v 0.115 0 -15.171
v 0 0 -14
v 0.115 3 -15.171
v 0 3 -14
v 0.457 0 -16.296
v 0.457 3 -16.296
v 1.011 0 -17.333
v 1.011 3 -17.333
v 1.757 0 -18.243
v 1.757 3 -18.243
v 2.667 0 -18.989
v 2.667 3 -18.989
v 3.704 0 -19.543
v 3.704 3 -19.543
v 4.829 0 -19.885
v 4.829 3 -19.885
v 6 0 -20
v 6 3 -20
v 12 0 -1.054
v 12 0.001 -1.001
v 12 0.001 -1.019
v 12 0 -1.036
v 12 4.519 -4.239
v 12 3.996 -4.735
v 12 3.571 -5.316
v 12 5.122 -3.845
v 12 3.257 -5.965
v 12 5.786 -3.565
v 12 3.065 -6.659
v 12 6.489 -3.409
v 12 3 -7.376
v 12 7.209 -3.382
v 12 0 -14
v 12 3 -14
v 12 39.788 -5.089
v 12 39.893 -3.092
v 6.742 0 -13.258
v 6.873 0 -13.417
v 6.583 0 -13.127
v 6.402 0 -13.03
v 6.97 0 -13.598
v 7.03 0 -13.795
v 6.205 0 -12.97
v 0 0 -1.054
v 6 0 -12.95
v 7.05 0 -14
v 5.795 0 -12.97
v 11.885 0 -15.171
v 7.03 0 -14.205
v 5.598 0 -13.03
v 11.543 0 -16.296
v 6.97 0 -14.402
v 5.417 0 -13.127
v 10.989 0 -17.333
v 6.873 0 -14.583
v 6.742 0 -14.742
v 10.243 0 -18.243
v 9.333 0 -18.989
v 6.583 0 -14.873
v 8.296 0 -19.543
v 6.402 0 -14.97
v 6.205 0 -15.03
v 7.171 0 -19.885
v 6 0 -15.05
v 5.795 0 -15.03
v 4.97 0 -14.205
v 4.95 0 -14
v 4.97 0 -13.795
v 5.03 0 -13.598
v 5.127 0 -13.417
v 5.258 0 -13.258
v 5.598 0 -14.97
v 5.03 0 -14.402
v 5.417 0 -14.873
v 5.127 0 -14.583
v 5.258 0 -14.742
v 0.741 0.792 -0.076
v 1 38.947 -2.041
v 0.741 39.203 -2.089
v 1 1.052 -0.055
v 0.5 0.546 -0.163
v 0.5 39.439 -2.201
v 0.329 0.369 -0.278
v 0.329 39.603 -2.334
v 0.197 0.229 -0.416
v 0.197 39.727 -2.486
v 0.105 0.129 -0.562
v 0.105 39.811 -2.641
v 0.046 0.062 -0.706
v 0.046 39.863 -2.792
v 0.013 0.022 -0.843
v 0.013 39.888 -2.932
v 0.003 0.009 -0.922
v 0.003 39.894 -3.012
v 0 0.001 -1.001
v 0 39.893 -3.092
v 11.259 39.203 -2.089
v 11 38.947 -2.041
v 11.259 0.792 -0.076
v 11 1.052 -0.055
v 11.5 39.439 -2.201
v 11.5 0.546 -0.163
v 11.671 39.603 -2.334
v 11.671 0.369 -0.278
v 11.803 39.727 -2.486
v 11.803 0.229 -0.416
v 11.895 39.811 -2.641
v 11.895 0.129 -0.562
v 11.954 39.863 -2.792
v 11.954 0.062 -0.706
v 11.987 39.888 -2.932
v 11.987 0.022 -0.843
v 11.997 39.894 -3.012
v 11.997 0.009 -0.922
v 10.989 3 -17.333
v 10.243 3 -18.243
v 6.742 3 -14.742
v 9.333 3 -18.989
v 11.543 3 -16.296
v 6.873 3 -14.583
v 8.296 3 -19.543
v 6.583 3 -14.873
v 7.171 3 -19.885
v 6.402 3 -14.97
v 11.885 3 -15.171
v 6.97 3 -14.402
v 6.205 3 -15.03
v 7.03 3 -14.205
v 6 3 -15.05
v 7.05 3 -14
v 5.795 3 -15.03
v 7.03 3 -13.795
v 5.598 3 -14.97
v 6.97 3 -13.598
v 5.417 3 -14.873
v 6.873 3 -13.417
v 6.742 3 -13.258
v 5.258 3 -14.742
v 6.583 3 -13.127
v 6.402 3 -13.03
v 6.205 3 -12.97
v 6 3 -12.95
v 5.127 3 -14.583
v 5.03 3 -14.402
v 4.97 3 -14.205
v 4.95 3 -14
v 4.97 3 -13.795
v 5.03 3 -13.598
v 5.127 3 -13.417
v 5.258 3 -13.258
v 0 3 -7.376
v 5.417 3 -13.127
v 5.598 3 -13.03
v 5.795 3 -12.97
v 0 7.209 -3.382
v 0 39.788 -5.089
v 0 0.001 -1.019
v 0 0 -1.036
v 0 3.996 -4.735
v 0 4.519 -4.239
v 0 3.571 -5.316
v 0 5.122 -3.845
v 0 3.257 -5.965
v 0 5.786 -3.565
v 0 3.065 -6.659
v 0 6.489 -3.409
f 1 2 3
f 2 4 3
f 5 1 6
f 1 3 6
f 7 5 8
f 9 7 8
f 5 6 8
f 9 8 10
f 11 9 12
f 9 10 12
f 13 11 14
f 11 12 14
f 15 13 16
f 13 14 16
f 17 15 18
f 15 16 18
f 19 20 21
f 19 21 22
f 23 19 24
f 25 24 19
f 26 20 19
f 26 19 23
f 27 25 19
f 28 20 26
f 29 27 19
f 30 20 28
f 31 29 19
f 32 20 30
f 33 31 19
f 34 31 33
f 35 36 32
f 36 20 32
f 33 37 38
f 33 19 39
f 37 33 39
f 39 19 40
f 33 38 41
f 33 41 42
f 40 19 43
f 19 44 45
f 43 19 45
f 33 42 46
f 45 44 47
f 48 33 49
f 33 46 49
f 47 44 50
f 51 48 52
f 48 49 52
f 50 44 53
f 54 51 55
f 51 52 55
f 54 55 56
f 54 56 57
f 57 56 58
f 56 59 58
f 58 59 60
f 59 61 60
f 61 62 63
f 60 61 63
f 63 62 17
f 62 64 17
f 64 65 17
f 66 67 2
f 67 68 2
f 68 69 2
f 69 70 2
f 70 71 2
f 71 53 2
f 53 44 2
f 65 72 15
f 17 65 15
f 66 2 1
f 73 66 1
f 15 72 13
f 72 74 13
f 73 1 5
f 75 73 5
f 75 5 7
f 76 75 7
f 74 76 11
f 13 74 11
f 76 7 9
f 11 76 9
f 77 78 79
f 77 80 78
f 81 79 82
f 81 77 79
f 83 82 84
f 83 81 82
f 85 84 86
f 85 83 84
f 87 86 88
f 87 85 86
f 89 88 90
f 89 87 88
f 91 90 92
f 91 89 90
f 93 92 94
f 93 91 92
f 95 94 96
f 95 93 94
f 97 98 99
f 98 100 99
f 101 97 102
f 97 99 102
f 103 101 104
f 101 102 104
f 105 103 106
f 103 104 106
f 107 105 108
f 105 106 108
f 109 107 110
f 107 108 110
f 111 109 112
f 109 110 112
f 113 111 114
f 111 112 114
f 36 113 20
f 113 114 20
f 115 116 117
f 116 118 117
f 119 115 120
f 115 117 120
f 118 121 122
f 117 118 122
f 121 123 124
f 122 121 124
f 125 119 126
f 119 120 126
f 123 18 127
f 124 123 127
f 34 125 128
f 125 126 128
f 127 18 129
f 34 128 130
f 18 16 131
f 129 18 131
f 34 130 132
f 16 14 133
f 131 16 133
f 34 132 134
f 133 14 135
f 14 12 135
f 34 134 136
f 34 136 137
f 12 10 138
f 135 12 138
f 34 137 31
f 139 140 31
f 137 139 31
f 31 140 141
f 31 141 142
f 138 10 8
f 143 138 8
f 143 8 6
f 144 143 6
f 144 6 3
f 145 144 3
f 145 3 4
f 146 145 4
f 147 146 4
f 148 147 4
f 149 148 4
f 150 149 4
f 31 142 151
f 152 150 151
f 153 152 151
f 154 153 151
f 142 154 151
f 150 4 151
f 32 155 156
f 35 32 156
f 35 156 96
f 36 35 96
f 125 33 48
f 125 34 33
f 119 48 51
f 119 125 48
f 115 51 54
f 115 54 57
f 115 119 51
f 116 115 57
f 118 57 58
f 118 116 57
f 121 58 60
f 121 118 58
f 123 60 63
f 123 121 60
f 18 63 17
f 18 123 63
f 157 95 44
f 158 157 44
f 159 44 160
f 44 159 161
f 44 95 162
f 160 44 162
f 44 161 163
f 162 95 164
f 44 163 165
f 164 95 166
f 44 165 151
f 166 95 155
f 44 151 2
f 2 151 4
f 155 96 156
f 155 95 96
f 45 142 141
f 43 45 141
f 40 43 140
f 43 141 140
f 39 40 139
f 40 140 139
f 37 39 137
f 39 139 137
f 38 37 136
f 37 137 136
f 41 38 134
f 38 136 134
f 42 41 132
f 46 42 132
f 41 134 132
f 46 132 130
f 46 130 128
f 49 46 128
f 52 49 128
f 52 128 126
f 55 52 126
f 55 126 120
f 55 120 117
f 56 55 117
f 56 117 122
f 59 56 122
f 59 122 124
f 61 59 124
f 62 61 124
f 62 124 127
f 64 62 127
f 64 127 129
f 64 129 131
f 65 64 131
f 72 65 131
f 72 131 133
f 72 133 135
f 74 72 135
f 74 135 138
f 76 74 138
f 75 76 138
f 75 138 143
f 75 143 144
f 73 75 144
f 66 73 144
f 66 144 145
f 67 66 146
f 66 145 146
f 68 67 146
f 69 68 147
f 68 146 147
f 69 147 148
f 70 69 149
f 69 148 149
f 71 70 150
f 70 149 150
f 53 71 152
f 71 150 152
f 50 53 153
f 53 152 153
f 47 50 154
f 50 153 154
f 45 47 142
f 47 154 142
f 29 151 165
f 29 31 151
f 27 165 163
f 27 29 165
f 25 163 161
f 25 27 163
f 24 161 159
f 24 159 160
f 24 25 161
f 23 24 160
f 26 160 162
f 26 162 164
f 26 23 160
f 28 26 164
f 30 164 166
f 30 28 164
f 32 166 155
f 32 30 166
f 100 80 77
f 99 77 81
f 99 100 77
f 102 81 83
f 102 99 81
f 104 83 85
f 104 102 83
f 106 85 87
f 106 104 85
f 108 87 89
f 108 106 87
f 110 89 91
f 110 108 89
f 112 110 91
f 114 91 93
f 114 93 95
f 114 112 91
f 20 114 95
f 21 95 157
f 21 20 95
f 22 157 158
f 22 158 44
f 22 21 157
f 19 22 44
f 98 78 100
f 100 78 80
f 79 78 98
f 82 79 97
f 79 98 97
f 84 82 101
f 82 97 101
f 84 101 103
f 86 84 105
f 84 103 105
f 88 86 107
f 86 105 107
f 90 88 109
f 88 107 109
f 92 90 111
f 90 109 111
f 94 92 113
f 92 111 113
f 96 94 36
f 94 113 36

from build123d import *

# Parameters (mm, degrees)
EXTRUDE_1_DEPTH     = 12
SKETCH_2_R          = 1.05
CUT_EXTRUDE_1_DEPTH = 12
FILLET_1_R          = 1
FILLET_2_R          = 6
FILLET_3_R          = 4


with BuildPart() as part:
    # 草图1 → 凸台-拉伸1 (new body)
    with BuildSketch(Plane(origin=(0, 0, 0), x_dir=(0, 0, -1), z_dir=(1, 0, 0))):
        Polygon((2.09343825, 39.94518139), (0, 0), (20, 0), (20, 3), (3.161340376, 3), (5.089326854, 39.788173521), align=None)
    extrude(amount=EXTRUDE_1_DEPTH)

    # 草图2 → 切除-拉伸1 (cut)
    with BuildSketch(Plane(origin=(0, 3, 0), x_dir=(1, 0, 0), z_dir=(0, 1, 0))):
        with Locations(Location((6, 14, 0), (0, 0, 270))):
            Circle(SKETCH_2_R)
    extrude(amount=-CUT_EXTRUDE_1_DEPTH, mode=Mode.SUBTRACT)

    # 圆角1
    fillet_1_edges = [part.edges().sort_by_distance(p)[0] for p in [
        (6, 0, 0),
        (6, 39.94518139, -2.09343825),
        (0, 19.972590695, -1.046719125),
        (12, 19.972590695, -1.046719125),
    ]]
    fillet(fillet_1_edges, radius=FILLET_1_R)

    # 圆角2
    fillet_2_edges = [part.edges().sort_by_distance(p)[0] for p in [
        (0, 1.5, -20),
        (12, 1.5, -20),
    ]]
    fillet(fillet_2_edges, radius=FILLET_2_R - 0.0001)  # a hair under: the kernel refuses the full size

    # 圆角3
    fillet_3_edges = [part.edges().sort_by_distance(p)[0] for p in [
        (6, 3, -3.161340376),
    ]]
    fillet(fillet_3_edges, radius=FILLET_3_R)


solid = part.part
